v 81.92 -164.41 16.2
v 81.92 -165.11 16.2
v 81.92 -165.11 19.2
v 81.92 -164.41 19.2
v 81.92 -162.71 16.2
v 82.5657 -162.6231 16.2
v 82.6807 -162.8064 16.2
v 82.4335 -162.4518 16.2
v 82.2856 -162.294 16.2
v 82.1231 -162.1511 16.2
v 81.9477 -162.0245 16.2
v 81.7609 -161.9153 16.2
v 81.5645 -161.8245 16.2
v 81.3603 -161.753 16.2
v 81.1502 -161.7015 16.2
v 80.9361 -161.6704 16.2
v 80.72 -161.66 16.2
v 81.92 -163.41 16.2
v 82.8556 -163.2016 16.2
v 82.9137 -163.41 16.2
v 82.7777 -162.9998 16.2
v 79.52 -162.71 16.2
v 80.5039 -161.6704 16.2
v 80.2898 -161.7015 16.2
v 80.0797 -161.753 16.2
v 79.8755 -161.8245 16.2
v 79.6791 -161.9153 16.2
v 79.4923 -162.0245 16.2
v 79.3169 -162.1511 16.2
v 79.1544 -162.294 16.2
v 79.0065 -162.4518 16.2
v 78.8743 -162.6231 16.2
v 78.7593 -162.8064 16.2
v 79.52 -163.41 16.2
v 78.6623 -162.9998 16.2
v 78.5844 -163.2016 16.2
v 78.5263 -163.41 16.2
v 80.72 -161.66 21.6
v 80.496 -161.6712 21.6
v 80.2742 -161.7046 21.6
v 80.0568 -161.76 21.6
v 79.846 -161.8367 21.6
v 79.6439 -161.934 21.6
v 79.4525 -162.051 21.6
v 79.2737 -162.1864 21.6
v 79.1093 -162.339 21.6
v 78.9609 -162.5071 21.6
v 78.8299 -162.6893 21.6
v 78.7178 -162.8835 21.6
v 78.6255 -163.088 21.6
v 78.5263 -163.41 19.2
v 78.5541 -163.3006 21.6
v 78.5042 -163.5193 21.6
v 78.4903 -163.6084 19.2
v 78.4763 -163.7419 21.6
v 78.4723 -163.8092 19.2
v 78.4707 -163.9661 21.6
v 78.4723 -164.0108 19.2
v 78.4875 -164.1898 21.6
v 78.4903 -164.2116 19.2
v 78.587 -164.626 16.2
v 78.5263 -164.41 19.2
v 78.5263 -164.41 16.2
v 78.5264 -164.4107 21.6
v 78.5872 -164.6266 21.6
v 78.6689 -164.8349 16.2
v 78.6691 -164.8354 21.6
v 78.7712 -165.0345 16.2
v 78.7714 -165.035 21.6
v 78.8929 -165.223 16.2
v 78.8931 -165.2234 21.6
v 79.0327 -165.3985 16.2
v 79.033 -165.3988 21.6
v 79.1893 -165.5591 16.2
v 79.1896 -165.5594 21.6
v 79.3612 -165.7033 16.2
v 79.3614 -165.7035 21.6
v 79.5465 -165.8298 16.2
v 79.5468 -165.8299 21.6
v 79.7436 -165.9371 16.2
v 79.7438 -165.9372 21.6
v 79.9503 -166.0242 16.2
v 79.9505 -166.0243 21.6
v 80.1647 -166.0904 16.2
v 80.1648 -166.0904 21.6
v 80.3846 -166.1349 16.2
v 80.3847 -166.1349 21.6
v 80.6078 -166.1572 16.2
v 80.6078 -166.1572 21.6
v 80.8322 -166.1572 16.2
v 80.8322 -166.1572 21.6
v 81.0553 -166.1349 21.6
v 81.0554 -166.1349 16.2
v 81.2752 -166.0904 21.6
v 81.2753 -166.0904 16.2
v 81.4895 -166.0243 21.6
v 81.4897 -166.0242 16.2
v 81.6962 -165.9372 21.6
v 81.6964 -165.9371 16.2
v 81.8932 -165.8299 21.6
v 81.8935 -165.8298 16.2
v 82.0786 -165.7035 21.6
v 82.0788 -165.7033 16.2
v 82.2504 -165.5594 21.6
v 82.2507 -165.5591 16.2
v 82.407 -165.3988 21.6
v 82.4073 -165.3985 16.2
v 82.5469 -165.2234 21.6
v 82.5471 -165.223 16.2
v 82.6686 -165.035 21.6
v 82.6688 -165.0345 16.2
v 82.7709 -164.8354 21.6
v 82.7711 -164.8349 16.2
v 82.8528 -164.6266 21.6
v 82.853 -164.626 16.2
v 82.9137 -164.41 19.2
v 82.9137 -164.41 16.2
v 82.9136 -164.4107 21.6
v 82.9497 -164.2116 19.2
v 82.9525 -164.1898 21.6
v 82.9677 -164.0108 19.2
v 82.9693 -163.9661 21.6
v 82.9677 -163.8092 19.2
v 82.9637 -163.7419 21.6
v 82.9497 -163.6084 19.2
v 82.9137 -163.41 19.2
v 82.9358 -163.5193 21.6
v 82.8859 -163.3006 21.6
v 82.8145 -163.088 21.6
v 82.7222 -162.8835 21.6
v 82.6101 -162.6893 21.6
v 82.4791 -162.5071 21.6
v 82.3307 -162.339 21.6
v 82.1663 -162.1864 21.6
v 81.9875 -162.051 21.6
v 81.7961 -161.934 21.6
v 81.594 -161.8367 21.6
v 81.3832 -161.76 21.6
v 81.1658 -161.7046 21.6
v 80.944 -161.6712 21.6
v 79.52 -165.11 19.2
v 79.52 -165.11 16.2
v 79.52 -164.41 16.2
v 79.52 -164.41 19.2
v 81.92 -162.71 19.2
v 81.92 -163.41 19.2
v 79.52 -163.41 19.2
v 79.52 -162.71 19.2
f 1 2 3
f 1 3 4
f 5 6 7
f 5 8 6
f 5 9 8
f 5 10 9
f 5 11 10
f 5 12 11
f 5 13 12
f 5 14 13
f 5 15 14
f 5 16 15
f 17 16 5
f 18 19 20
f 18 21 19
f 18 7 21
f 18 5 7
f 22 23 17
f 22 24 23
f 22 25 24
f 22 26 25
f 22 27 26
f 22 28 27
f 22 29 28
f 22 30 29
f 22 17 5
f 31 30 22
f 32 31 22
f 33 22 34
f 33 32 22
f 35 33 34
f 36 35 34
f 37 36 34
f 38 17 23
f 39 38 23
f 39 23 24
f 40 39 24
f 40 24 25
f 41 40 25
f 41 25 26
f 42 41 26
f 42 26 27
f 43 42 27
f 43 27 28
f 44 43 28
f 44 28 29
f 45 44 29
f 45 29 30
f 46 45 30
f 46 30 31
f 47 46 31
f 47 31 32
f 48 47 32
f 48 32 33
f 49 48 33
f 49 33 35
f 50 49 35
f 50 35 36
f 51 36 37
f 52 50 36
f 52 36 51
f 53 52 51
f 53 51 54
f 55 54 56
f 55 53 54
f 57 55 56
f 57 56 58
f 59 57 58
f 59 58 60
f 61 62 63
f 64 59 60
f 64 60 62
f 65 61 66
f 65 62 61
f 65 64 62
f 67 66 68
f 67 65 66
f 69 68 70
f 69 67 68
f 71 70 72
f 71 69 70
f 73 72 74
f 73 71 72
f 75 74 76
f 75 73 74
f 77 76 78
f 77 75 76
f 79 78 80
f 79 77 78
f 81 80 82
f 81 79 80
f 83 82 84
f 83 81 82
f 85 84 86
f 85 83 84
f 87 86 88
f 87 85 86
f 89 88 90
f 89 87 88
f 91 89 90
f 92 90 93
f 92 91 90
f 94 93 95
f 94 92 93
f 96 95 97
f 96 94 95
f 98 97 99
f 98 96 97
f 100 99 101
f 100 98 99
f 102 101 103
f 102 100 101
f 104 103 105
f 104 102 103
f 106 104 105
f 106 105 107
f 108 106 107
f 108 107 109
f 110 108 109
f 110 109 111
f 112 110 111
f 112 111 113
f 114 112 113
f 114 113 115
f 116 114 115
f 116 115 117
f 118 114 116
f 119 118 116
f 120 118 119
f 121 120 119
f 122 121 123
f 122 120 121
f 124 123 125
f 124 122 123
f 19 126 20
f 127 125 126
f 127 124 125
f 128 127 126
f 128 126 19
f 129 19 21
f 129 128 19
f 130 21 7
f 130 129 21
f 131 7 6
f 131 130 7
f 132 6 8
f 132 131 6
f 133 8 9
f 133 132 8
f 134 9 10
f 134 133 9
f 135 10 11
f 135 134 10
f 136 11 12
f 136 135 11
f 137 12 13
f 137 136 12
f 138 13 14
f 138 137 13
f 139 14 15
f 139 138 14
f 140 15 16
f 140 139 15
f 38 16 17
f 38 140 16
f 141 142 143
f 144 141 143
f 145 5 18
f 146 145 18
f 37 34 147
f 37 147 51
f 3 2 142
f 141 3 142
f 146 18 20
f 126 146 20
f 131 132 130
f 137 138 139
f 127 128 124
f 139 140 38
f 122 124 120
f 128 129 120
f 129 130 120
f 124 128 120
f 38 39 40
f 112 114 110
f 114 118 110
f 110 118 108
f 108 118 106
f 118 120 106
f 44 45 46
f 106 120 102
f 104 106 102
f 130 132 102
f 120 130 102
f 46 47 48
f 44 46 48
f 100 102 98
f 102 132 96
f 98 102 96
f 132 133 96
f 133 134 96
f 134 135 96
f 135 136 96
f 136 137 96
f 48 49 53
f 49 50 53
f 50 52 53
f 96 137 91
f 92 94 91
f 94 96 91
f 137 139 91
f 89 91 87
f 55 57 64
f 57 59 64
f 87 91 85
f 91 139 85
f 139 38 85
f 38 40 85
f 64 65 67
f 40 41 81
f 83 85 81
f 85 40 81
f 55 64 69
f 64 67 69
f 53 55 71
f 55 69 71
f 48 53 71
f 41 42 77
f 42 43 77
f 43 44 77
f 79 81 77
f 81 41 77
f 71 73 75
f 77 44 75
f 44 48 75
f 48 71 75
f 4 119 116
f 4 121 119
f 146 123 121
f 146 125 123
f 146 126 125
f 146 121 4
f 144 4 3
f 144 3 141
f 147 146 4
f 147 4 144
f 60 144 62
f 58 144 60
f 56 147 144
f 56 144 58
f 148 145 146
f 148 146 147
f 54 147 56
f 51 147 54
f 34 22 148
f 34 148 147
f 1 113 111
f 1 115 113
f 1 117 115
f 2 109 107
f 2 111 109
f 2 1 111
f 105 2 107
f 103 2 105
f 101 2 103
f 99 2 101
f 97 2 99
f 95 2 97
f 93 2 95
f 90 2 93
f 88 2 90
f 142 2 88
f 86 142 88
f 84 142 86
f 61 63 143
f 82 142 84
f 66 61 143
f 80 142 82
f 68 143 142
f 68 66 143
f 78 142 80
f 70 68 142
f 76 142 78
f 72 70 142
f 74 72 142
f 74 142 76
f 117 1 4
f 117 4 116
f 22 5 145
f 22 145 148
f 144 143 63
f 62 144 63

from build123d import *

# Parameters (mm, degrees)
SKETCH007_W                   = 2.25
SKETCH007_H                   = 5.4
POCKET003_DEPTH               = 3
POCKET003_MIRRORED001_2_DEPTH = 3


with BuildPart() as part:
    # Sketch007 → Revolution (revolve)
    with BuildSketch(Plane.YZ):
        with Locations((1.125, 2.7)):
            Rectangle(SKETCH007_W, SKETCH007_H)
    revolve(axis=Axis((0, 0, 0), (0, 0, 1)))

    # Sketch008 → Pocket003 (cut)
    with BuildSketch(Plane.XY):
        Polygon((-3, 0), (0, 0), (0, 1.2), (-1.2, 1.2), (-1.2, 0.5), (-3, 0.5), align=None)
    pocket003 = extrude(amount=POCKET003_DEPTH, mode=Mode.SUBTRACT)

    # Sketch008 Mirrored001 2 → Pocket003 Mirrored001 2 (cut)
    with BuildSketch(Plane(origin=(0, 0, 0), x_dir=(-1, 0, 0), z_dir=(0, 0, -1))):
        Polygon((-3, 0), (0, 0), (0, 1.2), (-1.2, 1.2), (-1.2, 0.5), (-3, 0.5), align=None)
    pocket003_mirrored001_2 = extrude(amount=-POCKET003_MIRRORED001_2_DEPTH, mode=Mode.SUBTRACT)

    # Mirrored002: Pocket003, Pocket003 Mirrored001 2 across Sketch008 H_Axis
    add(pocket003.mirror(Plane.ZX), mode=Mode.SUBTRACT)
    add(pocket003_mirrored001_2.mirror(Plane.ZX), mode=Mode.SUBTRACT)


with BuildPart() as part_1:
    # Body003 placement: moved
    add(part.part.moved(Location((80.72, -163.91, 16.2))))


solid = part_1.part
